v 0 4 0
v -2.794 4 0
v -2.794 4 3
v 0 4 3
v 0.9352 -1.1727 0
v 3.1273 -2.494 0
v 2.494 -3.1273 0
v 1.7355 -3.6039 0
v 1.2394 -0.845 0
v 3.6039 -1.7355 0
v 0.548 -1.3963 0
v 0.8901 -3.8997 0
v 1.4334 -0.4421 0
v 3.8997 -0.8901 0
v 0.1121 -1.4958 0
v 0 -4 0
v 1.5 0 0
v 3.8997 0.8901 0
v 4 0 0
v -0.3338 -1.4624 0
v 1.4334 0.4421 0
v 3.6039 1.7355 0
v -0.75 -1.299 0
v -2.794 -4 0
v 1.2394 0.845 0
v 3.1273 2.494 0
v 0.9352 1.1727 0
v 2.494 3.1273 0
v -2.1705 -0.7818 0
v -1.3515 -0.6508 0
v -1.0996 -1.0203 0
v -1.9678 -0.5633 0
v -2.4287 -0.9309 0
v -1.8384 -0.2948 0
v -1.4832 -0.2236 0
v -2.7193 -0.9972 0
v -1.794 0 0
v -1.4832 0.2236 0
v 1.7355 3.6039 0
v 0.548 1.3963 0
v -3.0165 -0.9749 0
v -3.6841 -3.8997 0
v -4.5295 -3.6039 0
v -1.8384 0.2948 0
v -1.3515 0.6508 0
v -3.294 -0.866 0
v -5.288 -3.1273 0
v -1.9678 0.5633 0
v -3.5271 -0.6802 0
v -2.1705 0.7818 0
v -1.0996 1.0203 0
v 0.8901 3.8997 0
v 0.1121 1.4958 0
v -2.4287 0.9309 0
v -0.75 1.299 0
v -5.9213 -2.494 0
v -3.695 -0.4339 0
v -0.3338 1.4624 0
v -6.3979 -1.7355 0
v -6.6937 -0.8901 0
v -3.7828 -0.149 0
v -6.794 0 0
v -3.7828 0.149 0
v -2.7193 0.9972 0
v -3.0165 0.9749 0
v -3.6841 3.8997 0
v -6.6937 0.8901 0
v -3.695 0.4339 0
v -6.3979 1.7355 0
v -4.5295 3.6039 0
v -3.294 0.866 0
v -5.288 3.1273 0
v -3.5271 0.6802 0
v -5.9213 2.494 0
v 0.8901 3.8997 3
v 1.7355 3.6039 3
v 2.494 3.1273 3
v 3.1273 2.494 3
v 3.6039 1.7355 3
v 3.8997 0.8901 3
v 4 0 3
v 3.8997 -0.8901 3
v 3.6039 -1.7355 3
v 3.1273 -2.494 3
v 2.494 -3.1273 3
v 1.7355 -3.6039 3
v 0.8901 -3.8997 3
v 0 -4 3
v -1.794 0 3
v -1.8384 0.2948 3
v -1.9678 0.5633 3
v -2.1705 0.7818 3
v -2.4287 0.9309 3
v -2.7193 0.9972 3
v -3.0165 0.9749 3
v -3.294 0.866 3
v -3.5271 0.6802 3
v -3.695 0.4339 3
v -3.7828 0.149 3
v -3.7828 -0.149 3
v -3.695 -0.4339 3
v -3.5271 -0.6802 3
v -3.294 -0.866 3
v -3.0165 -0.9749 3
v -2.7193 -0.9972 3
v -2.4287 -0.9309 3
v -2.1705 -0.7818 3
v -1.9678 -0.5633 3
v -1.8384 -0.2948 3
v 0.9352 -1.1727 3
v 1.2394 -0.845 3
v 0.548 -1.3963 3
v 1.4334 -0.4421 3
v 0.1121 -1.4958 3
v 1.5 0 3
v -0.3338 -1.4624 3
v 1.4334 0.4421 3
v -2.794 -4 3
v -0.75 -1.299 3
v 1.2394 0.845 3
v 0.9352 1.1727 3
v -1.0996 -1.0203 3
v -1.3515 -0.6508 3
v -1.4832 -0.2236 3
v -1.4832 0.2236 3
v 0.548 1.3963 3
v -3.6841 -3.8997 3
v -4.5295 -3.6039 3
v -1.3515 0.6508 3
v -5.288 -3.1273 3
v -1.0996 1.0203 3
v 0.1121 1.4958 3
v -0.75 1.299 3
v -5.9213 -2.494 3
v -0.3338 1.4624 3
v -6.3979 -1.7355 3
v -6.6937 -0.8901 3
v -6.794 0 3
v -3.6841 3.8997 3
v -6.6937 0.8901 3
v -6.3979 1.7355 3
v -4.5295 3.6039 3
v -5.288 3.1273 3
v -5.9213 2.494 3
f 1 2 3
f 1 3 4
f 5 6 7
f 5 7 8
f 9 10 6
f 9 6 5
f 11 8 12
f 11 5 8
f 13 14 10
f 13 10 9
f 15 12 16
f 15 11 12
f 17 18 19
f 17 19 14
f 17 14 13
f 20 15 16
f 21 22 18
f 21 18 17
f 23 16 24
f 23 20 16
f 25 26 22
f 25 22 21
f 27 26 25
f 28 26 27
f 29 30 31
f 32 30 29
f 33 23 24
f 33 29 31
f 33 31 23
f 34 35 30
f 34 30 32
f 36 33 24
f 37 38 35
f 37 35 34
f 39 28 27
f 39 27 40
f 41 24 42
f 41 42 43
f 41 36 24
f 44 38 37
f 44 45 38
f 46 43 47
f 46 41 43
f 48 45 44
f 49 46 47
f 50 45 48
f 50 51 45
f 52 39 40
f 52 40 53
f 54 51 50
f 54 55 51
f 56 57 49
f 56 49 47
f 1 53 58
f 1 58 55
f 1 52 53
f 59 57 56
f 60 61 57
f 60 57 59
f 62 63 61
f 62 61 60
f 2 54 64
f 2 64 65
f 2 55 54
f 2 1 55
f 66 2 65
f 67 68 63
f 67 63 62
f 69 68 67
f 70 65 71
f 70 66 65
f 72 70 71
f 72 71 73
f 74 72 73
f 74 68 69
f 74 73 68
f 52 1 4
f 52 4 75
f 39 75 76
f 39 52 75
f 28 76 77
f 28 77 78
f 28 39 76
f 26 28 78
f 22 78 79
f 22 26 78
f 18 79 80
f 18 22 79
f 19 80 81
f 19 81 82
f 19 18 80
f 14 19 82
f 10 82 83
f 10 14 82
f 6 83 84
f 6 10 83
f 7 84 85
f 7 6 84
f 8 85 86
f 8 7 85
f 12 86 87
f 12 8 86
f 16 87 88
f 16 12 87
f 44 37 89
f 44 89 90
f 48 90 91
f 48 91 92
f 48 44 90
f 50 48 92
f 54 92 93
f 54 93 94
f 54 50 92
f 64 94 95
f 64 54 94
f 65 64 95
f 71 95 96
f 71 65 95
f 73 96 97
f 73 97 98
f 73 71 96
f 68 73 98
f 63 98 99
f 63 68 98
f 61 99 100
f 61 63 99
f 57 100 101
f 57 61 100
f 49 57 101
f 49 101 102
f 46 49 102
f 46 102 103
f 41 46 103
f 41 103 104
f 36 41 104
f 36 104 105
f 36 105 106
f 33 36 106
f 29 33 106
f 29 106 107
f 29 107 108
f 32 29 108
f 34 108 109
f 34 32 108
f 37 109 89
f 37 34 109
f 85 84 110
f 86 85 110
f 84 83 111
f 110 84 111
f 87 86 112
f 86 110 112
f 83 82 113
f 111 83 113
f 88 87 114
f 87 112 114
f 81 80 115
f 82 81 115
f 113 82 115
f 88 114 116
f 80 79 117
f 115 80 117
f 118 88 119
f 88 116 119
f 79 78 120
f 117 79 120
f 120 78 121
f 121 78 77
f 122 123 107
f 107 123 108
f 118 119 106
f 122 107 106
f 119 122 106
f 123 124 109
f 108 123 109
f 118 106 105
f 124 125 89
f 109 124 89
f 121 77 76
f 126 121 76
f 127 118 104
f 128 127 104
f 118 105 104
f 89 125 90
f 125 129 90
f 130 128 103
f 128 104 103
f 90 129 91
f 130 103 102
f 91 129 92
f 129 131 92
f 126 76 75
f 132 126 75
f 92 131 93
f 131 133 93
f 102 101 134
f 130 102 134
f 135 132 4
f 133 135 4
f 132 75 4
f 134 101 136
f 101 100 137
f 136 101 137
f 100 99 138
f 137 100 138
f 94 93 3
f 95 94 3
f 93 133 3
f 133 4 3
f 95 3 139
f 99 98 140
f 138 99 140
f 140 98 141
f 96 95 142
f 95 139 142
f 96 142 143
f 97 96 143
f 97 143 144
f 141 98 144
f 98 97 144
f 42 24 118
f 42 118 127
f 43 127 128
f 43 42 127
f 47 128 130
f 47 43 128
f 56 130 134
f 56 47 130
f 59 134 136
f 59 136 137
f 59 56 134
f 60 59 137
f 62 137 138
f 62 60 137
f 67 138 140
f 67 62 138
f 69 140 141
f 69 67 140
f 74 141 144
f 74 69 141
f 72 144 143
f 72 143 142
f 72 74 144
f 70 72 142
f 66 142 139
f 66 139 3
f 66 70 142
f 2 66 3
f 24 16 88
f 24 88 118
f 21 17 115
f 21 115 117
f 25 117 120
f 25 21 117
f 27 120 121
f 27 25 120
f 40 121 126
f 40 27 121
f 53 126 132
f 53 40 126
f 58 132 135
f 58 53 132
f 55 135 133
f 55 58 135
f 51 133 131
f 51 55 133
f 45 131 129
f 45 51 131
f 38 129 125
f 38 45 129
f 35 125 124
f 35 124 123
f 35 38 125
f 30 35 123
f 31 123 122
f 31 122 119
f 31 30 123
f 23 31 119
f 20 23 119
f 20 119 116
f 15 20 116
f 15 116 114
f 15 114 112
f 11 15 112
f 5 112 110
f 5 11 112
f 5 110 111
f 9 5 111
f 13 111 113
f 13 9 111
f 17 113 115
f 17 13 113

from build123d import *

# Parameters (mm, degrees)
SKETCH_1_R      = 1
SKETCH_1_R_2    = 1.5
EXTRUDE_1_DEPTH = 3


with BuildPart() as part:
    # 스케치1 → 보스-돌출1 (new body)
    with BuildSketch(Plane.XY):
        with BuildLine():
            Line((-2.794, 4), (0, 4))
            ThreePointArc((0, 4), (4, 0), (0, -4))
            Line((0, -4), (-2.794, -4))
            ThreePointArc((-2.794, -4), (-6.794, 0), (-2.794, 4))
        make_face()
        with Locations((-2.794, 0)):
            Circle(SKETCH_1_R, mode=Mode.SUBTRACT)
        Circle(SKETCH_1_R_2, mode=Mode.SUBTRACT)
    extrude(amount=EXTRUDE_1_DEPTH)


solid = part.part
